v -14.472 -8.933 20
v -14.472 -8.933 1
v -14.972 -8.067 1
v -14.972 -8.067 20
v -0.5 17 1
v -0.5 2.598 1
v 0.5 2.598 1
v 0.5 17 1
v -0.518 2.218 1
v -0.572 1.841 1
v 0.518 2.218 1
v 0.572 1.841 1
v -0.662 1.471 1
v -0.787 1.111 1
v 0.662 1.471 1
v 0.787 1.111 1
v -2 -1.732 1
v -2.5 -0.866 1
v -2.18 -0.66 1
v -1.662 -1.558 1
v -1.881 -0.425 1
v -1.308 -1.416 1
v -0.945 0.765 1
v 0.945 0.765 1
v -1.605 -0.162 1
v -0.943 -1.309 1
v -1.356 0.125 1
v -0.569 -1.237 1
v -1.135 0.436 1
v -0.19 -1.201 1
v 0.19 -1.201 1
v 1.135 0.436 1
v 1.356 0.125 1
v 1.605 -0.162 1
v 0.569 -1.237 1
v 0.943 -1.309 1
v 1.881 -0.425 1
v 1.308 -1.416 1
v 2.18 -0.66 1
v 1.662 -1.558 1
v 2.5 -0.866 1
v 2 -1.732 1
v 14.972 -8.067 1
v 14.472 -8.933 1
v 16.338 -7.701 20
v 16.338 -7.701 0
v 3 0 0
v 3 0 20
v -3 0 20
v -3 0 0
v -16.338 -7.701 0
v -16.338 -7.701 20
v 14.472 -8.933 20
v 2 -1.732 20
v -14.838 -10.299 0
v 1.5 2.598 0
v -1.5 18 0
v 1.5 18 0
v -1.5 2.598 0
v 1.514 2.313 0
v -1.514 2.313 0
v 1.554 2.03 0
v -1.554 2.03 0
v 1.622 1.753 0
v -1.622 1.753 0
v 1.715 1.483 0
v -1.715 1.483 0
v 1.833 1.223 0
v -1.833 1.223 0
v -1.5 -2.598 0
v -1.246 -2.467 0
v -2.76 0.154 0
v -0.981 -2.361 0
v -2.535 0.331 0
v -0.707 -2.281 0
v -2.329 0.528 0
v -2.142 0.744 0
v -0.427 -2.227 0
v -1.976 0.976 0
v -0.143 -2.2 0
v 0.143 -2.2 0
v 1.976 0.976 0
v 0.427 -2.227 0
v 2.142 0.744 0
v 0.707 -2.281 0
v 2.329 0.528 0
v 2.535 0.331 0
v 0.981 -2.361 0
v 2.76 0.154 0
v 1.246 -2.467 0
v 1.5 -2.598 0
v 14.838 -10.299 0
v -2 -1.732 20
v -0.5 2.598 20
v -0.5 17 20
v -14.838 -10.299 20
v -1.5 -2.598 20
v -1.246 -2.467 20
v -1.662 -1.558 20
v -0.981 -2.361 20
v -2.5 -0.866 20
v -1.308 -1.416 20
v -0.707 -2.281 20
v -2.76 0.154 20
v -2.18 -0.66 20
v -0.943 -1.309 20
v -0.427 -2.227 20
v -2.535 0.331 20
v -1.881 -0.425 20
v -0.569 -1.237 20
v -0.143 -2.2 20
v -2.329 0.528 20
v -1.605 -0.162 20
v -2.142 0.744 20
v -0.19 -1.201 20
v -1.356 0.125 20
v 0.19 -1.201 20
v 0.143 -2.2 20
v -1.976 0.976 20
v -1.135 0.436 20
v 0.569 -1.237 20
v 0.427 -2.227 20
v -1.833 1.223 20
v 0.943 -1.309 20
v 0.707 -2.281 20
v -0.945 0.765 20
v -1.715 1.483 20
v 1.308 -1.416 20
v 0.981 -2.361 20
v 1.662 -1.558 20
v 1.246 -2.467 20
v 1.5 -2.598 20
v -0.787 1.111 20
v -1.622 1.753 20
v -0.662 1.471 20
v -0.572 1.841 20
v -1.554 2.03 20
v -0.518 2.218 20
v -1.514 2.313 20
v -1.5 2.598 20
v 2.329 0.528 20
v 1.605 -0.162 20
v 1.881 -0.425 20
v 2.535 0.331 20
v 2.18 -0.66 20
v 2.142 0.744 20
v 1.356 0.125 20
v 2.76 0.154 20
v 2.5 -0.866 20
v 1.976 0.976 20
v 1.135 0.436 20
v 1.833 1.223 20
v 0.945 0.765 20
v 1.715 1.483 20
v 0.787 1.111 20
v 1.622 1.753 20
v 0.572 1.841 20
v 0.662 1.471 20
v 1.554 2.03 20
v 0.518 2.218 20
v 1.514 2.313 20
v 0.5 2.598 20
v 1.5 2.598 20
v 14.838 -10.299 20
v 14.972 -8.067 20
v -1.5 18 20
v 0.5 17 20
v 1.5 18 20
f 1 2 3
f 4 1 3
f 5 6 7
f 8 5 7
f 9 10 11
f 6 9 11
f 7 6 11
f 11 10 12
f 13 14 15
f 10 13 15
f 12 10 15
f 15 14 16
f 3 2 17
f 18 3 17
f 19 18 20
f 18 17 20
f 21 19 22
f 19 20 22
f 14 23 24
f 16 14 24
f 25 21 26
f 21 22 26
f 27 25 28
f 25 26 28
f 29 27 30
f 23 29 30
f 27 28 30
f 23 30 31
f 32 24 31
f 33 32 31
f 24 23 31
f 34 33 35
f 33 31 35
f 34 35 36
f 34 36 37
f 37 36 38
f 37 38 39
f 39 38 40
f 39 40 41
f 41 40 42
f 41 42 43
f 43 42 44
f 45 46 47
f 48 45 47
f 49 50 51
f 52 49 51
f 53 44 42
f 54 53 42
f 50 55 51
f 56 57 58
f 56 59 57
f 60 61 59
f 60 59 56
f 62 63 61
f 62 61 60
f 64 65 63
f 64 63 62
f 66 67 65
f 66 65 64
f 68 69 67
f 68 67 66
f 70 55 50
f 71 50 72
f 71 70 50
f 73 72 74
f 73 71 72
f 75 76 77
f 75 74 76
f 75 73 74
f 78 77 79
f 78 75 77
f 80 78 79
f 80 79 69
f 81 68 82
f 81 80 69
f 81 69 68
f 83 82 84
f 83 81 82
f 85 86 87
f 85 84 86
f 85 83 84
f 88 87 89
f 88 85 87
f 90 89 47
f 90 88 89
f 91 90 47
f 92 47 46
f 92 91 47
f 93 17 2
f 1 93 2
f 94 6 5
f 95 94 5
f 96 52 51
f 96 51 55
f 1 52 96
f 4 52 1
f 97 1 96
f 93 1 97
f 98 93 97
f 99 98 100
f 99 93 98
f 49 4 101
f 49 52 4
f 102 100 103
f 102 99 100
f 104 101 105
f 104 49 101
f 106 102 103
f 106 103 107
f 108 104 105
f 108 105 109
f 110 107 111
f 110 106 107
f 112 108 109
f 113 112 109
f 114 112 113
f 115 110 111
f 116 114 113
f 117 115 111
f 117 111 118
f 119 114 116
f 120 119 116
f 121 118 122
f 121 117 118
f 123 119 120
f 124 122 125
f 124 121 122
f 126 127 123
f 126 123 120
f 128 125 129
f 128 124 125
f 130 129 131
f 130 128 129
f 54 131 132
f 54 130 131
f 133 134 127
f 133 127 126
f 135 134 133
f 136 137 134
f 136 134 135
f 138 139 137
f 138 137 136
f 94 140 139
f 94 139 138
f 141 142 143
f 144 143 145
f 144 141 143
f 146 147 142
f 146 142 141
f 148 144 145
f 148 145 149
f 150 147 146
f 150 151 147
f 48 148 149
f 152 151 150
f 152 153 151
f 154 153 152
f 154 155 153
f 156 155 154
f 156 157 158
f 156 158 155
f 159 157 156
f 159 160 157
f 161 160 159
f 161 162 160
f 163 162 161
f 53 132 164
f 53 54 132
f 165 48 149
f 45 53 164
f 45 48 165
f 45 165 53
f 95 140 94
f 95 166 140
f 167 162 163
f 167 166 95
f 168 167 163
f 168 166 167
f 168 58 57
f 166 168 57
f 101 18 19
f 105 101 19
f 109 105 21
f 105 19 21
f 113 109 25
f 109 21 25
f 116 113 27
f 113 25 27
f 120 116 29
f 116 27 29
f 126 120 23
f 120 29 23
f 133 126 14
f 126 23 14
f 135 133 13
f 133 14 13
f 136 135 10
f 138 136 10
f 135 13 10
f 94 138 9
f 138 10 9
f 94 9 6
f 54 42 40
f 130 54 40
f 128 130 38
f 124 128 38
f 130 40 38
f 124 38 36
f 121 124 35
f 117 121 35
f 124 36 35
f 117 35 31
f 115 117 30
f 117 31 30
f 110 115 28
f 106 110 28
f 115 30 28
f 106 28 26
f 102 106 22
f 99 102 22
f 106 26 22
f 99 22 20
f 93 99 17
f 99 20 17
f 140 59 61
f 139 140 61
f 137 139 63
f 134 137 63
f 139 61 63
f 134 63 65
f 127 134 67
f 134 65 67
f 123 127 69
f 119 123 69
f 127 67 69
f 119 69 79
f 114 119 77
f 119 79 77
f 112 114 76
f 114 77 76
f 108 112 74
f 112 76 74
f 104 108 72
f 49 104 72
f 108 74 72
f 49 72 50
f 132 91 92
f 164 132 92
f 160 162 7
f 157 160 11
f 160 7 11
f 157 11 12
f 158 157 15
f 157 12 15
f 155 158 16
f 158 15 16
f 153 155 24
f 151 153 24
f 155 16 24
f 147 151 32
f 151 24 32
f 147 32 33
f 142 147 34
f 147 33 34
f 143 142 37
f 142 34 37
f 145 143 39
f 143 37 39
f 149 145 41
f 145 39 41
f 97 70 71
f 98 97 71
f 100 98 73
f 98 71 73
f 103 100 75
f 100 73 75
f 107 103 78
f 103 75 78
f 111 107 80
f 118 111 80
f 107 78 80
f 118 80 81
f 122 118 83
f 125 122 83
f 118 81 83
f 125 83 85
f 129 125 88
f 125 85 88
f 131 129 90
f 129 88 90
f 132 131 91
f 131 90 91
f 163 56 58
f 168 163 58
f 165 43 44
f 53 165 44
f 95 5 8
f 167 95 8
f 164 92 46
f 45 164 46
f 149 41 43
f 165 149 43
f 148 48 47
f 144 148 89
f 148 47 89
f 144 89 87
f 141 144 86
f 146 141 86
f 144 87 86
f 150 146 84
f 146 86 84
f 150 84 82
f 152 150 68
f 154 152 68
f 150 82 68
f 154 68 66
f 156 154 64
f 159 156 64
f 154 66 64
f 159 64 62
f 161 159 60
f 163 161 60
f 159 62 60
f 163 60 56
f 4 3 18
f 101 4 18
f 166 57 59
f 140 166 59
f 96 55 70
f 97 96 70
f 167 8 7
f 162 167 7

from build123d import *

# Parameters (mm, degrees)
F1_DEPTH = 20
F3_DEPTH = 1


with BuildPart() as f1:
    # F0 (on Top) → F1 (new body)
    with BuildSketch(Plane.XY):
        with BuildLine():
            Line((0.5, 17), (-0.5, 17))
            Line((-0.5, 17), (-0.5, 2.598076))
            ThreePointArc((-0.5, 2.598076), (-1.035898, 0.598076), (-2.5, -0.866025))
            Line((-2.5, -0.866025), (-14.972432, -8.066987))
            Line((-14.972432, -8.066987), (-14.472432, -8.933013))
            Line((-14.472432, -8.933013), (-2, -1.732051))
            ThreePointArc((-2, -1.732051), (0, -1.196152), (2, -1.732051))
            Line((2, -1.732051), (14.472432, -8.933013))
            Line((14.472432, -8.933013), (14.972432, -8.066987))
            Line((14.972432, -8.066987), (2.5, -0.866025))
            ThreePointArc((2.5, -0.866025), (1.035898, 0.598076), (0.5, 2.598076))
            Line((0.5, 2.598076), (0.5, 17))
        make_face()
        with BuildLine():
            Line((1.5, 18), (-1.5, 18))
            Line((-1.5, 18), (-1.5, 2.598076))
            ThreePointArc((-1.5, 2.598076), (-1.901924, 1.098076), (-3, 0))
            Line((-3, 0), (-16.338457, -7.700962))
            Line((-16.338457, -7.700962), (-14.838457, -10.299038))
            Line((-14.838457, -10.299038), (-1.5, -2.598076))
            ThreePointArc((-1.5, -2.598076), (0, -2.196152), (1.5, -2.598076))
            Line((1.5, -2.598076), (14.838457, -10.299038))
            Line((14.838457, -10.299038), (16.338457, -7.700962))
            Line((16.338457, -7.700962), (3, 0))
            ThreePointArc((3, 0), (1.901924, 1.098076), (1.5, 2.598076))
            Line((1.5, 2.598076), (1.5, 18))
        make_face()
        with BuildLine():
            Line((-0.5, 2.598076), (-0.5, 17))
            Line((-0.5, 17), (0.5, 17))
            Line((0.5, 17), (0.5, 2.598076))
            ThreePointArc((0.5, 2.598076), (1.035898, 0.598076), (2.5, -0.866025))
            Line((2.5, -0.866025), (14.972432, -8.066987))
            Line((14.972432, -8.066987), (14.472432, -8.933013))
            Line((14.472432, -8.933013), (2, -1.732051))
            ThreePointArc((2, -1.732051), (0, -1.196152), (-2, -1.732051))
            Line((-2, -1.732051), (-14.472432, -8.933013))
            Line((-14.472432, -8.933013), (-14.972432, -8.066987))
            Line((-14.972432, -8.066987), (-2.5, -0.866025))
            ThreePointArc((-2.5, -0.866025), (-1.035898, 0.598076), (-0.5, 2.598076))
        make_face(mode=Mode.SUBTRACT)
    extrude(amount=F1_DEPTH)

    # F2 (on face) → F3 (join)
    with BuildSketch(Plane(origin=(0, 0, 0), x_dir=(1, 0, 0), z_dir=(0, 0, -1))):
        with BuildLine():
            Line((-0.5, -2.598076), (-0.5, -17))
            Line((-0.5, -17), (0.5, -17))
            Line((0.5, -17), (0.5, -2.598076))
            ThreePointArc((0.5, -2.598076), (1.035898, -0.598076), (2.5, 0.866025))
            Line((2.5, 0.866025), (14.972432, 8.066987))
            Line((14.972432, 8.066987), (14.472432, 8.933013))
            Line((14.472432, 8.933013), (2, 1.732051))
            ThreePointArc((2, 1.732051), (0, 1.196152), (-2, 1.732051))
            Line((-2, 1.732051), (-14.472432, 8.933013))
            Line((-14.472432, 8.933013), (-14.972432, 8.066987))
            Line((-14.972432, 8.066987), (-2.5, 0.866025))
            ThreePointArc((-2.5, 0.866025), (-1.035898, -0.598076), (-0.5, -2.598076))
        make_face()
    extrude(amount=-F3_DEPTH)


solid = f1.part
